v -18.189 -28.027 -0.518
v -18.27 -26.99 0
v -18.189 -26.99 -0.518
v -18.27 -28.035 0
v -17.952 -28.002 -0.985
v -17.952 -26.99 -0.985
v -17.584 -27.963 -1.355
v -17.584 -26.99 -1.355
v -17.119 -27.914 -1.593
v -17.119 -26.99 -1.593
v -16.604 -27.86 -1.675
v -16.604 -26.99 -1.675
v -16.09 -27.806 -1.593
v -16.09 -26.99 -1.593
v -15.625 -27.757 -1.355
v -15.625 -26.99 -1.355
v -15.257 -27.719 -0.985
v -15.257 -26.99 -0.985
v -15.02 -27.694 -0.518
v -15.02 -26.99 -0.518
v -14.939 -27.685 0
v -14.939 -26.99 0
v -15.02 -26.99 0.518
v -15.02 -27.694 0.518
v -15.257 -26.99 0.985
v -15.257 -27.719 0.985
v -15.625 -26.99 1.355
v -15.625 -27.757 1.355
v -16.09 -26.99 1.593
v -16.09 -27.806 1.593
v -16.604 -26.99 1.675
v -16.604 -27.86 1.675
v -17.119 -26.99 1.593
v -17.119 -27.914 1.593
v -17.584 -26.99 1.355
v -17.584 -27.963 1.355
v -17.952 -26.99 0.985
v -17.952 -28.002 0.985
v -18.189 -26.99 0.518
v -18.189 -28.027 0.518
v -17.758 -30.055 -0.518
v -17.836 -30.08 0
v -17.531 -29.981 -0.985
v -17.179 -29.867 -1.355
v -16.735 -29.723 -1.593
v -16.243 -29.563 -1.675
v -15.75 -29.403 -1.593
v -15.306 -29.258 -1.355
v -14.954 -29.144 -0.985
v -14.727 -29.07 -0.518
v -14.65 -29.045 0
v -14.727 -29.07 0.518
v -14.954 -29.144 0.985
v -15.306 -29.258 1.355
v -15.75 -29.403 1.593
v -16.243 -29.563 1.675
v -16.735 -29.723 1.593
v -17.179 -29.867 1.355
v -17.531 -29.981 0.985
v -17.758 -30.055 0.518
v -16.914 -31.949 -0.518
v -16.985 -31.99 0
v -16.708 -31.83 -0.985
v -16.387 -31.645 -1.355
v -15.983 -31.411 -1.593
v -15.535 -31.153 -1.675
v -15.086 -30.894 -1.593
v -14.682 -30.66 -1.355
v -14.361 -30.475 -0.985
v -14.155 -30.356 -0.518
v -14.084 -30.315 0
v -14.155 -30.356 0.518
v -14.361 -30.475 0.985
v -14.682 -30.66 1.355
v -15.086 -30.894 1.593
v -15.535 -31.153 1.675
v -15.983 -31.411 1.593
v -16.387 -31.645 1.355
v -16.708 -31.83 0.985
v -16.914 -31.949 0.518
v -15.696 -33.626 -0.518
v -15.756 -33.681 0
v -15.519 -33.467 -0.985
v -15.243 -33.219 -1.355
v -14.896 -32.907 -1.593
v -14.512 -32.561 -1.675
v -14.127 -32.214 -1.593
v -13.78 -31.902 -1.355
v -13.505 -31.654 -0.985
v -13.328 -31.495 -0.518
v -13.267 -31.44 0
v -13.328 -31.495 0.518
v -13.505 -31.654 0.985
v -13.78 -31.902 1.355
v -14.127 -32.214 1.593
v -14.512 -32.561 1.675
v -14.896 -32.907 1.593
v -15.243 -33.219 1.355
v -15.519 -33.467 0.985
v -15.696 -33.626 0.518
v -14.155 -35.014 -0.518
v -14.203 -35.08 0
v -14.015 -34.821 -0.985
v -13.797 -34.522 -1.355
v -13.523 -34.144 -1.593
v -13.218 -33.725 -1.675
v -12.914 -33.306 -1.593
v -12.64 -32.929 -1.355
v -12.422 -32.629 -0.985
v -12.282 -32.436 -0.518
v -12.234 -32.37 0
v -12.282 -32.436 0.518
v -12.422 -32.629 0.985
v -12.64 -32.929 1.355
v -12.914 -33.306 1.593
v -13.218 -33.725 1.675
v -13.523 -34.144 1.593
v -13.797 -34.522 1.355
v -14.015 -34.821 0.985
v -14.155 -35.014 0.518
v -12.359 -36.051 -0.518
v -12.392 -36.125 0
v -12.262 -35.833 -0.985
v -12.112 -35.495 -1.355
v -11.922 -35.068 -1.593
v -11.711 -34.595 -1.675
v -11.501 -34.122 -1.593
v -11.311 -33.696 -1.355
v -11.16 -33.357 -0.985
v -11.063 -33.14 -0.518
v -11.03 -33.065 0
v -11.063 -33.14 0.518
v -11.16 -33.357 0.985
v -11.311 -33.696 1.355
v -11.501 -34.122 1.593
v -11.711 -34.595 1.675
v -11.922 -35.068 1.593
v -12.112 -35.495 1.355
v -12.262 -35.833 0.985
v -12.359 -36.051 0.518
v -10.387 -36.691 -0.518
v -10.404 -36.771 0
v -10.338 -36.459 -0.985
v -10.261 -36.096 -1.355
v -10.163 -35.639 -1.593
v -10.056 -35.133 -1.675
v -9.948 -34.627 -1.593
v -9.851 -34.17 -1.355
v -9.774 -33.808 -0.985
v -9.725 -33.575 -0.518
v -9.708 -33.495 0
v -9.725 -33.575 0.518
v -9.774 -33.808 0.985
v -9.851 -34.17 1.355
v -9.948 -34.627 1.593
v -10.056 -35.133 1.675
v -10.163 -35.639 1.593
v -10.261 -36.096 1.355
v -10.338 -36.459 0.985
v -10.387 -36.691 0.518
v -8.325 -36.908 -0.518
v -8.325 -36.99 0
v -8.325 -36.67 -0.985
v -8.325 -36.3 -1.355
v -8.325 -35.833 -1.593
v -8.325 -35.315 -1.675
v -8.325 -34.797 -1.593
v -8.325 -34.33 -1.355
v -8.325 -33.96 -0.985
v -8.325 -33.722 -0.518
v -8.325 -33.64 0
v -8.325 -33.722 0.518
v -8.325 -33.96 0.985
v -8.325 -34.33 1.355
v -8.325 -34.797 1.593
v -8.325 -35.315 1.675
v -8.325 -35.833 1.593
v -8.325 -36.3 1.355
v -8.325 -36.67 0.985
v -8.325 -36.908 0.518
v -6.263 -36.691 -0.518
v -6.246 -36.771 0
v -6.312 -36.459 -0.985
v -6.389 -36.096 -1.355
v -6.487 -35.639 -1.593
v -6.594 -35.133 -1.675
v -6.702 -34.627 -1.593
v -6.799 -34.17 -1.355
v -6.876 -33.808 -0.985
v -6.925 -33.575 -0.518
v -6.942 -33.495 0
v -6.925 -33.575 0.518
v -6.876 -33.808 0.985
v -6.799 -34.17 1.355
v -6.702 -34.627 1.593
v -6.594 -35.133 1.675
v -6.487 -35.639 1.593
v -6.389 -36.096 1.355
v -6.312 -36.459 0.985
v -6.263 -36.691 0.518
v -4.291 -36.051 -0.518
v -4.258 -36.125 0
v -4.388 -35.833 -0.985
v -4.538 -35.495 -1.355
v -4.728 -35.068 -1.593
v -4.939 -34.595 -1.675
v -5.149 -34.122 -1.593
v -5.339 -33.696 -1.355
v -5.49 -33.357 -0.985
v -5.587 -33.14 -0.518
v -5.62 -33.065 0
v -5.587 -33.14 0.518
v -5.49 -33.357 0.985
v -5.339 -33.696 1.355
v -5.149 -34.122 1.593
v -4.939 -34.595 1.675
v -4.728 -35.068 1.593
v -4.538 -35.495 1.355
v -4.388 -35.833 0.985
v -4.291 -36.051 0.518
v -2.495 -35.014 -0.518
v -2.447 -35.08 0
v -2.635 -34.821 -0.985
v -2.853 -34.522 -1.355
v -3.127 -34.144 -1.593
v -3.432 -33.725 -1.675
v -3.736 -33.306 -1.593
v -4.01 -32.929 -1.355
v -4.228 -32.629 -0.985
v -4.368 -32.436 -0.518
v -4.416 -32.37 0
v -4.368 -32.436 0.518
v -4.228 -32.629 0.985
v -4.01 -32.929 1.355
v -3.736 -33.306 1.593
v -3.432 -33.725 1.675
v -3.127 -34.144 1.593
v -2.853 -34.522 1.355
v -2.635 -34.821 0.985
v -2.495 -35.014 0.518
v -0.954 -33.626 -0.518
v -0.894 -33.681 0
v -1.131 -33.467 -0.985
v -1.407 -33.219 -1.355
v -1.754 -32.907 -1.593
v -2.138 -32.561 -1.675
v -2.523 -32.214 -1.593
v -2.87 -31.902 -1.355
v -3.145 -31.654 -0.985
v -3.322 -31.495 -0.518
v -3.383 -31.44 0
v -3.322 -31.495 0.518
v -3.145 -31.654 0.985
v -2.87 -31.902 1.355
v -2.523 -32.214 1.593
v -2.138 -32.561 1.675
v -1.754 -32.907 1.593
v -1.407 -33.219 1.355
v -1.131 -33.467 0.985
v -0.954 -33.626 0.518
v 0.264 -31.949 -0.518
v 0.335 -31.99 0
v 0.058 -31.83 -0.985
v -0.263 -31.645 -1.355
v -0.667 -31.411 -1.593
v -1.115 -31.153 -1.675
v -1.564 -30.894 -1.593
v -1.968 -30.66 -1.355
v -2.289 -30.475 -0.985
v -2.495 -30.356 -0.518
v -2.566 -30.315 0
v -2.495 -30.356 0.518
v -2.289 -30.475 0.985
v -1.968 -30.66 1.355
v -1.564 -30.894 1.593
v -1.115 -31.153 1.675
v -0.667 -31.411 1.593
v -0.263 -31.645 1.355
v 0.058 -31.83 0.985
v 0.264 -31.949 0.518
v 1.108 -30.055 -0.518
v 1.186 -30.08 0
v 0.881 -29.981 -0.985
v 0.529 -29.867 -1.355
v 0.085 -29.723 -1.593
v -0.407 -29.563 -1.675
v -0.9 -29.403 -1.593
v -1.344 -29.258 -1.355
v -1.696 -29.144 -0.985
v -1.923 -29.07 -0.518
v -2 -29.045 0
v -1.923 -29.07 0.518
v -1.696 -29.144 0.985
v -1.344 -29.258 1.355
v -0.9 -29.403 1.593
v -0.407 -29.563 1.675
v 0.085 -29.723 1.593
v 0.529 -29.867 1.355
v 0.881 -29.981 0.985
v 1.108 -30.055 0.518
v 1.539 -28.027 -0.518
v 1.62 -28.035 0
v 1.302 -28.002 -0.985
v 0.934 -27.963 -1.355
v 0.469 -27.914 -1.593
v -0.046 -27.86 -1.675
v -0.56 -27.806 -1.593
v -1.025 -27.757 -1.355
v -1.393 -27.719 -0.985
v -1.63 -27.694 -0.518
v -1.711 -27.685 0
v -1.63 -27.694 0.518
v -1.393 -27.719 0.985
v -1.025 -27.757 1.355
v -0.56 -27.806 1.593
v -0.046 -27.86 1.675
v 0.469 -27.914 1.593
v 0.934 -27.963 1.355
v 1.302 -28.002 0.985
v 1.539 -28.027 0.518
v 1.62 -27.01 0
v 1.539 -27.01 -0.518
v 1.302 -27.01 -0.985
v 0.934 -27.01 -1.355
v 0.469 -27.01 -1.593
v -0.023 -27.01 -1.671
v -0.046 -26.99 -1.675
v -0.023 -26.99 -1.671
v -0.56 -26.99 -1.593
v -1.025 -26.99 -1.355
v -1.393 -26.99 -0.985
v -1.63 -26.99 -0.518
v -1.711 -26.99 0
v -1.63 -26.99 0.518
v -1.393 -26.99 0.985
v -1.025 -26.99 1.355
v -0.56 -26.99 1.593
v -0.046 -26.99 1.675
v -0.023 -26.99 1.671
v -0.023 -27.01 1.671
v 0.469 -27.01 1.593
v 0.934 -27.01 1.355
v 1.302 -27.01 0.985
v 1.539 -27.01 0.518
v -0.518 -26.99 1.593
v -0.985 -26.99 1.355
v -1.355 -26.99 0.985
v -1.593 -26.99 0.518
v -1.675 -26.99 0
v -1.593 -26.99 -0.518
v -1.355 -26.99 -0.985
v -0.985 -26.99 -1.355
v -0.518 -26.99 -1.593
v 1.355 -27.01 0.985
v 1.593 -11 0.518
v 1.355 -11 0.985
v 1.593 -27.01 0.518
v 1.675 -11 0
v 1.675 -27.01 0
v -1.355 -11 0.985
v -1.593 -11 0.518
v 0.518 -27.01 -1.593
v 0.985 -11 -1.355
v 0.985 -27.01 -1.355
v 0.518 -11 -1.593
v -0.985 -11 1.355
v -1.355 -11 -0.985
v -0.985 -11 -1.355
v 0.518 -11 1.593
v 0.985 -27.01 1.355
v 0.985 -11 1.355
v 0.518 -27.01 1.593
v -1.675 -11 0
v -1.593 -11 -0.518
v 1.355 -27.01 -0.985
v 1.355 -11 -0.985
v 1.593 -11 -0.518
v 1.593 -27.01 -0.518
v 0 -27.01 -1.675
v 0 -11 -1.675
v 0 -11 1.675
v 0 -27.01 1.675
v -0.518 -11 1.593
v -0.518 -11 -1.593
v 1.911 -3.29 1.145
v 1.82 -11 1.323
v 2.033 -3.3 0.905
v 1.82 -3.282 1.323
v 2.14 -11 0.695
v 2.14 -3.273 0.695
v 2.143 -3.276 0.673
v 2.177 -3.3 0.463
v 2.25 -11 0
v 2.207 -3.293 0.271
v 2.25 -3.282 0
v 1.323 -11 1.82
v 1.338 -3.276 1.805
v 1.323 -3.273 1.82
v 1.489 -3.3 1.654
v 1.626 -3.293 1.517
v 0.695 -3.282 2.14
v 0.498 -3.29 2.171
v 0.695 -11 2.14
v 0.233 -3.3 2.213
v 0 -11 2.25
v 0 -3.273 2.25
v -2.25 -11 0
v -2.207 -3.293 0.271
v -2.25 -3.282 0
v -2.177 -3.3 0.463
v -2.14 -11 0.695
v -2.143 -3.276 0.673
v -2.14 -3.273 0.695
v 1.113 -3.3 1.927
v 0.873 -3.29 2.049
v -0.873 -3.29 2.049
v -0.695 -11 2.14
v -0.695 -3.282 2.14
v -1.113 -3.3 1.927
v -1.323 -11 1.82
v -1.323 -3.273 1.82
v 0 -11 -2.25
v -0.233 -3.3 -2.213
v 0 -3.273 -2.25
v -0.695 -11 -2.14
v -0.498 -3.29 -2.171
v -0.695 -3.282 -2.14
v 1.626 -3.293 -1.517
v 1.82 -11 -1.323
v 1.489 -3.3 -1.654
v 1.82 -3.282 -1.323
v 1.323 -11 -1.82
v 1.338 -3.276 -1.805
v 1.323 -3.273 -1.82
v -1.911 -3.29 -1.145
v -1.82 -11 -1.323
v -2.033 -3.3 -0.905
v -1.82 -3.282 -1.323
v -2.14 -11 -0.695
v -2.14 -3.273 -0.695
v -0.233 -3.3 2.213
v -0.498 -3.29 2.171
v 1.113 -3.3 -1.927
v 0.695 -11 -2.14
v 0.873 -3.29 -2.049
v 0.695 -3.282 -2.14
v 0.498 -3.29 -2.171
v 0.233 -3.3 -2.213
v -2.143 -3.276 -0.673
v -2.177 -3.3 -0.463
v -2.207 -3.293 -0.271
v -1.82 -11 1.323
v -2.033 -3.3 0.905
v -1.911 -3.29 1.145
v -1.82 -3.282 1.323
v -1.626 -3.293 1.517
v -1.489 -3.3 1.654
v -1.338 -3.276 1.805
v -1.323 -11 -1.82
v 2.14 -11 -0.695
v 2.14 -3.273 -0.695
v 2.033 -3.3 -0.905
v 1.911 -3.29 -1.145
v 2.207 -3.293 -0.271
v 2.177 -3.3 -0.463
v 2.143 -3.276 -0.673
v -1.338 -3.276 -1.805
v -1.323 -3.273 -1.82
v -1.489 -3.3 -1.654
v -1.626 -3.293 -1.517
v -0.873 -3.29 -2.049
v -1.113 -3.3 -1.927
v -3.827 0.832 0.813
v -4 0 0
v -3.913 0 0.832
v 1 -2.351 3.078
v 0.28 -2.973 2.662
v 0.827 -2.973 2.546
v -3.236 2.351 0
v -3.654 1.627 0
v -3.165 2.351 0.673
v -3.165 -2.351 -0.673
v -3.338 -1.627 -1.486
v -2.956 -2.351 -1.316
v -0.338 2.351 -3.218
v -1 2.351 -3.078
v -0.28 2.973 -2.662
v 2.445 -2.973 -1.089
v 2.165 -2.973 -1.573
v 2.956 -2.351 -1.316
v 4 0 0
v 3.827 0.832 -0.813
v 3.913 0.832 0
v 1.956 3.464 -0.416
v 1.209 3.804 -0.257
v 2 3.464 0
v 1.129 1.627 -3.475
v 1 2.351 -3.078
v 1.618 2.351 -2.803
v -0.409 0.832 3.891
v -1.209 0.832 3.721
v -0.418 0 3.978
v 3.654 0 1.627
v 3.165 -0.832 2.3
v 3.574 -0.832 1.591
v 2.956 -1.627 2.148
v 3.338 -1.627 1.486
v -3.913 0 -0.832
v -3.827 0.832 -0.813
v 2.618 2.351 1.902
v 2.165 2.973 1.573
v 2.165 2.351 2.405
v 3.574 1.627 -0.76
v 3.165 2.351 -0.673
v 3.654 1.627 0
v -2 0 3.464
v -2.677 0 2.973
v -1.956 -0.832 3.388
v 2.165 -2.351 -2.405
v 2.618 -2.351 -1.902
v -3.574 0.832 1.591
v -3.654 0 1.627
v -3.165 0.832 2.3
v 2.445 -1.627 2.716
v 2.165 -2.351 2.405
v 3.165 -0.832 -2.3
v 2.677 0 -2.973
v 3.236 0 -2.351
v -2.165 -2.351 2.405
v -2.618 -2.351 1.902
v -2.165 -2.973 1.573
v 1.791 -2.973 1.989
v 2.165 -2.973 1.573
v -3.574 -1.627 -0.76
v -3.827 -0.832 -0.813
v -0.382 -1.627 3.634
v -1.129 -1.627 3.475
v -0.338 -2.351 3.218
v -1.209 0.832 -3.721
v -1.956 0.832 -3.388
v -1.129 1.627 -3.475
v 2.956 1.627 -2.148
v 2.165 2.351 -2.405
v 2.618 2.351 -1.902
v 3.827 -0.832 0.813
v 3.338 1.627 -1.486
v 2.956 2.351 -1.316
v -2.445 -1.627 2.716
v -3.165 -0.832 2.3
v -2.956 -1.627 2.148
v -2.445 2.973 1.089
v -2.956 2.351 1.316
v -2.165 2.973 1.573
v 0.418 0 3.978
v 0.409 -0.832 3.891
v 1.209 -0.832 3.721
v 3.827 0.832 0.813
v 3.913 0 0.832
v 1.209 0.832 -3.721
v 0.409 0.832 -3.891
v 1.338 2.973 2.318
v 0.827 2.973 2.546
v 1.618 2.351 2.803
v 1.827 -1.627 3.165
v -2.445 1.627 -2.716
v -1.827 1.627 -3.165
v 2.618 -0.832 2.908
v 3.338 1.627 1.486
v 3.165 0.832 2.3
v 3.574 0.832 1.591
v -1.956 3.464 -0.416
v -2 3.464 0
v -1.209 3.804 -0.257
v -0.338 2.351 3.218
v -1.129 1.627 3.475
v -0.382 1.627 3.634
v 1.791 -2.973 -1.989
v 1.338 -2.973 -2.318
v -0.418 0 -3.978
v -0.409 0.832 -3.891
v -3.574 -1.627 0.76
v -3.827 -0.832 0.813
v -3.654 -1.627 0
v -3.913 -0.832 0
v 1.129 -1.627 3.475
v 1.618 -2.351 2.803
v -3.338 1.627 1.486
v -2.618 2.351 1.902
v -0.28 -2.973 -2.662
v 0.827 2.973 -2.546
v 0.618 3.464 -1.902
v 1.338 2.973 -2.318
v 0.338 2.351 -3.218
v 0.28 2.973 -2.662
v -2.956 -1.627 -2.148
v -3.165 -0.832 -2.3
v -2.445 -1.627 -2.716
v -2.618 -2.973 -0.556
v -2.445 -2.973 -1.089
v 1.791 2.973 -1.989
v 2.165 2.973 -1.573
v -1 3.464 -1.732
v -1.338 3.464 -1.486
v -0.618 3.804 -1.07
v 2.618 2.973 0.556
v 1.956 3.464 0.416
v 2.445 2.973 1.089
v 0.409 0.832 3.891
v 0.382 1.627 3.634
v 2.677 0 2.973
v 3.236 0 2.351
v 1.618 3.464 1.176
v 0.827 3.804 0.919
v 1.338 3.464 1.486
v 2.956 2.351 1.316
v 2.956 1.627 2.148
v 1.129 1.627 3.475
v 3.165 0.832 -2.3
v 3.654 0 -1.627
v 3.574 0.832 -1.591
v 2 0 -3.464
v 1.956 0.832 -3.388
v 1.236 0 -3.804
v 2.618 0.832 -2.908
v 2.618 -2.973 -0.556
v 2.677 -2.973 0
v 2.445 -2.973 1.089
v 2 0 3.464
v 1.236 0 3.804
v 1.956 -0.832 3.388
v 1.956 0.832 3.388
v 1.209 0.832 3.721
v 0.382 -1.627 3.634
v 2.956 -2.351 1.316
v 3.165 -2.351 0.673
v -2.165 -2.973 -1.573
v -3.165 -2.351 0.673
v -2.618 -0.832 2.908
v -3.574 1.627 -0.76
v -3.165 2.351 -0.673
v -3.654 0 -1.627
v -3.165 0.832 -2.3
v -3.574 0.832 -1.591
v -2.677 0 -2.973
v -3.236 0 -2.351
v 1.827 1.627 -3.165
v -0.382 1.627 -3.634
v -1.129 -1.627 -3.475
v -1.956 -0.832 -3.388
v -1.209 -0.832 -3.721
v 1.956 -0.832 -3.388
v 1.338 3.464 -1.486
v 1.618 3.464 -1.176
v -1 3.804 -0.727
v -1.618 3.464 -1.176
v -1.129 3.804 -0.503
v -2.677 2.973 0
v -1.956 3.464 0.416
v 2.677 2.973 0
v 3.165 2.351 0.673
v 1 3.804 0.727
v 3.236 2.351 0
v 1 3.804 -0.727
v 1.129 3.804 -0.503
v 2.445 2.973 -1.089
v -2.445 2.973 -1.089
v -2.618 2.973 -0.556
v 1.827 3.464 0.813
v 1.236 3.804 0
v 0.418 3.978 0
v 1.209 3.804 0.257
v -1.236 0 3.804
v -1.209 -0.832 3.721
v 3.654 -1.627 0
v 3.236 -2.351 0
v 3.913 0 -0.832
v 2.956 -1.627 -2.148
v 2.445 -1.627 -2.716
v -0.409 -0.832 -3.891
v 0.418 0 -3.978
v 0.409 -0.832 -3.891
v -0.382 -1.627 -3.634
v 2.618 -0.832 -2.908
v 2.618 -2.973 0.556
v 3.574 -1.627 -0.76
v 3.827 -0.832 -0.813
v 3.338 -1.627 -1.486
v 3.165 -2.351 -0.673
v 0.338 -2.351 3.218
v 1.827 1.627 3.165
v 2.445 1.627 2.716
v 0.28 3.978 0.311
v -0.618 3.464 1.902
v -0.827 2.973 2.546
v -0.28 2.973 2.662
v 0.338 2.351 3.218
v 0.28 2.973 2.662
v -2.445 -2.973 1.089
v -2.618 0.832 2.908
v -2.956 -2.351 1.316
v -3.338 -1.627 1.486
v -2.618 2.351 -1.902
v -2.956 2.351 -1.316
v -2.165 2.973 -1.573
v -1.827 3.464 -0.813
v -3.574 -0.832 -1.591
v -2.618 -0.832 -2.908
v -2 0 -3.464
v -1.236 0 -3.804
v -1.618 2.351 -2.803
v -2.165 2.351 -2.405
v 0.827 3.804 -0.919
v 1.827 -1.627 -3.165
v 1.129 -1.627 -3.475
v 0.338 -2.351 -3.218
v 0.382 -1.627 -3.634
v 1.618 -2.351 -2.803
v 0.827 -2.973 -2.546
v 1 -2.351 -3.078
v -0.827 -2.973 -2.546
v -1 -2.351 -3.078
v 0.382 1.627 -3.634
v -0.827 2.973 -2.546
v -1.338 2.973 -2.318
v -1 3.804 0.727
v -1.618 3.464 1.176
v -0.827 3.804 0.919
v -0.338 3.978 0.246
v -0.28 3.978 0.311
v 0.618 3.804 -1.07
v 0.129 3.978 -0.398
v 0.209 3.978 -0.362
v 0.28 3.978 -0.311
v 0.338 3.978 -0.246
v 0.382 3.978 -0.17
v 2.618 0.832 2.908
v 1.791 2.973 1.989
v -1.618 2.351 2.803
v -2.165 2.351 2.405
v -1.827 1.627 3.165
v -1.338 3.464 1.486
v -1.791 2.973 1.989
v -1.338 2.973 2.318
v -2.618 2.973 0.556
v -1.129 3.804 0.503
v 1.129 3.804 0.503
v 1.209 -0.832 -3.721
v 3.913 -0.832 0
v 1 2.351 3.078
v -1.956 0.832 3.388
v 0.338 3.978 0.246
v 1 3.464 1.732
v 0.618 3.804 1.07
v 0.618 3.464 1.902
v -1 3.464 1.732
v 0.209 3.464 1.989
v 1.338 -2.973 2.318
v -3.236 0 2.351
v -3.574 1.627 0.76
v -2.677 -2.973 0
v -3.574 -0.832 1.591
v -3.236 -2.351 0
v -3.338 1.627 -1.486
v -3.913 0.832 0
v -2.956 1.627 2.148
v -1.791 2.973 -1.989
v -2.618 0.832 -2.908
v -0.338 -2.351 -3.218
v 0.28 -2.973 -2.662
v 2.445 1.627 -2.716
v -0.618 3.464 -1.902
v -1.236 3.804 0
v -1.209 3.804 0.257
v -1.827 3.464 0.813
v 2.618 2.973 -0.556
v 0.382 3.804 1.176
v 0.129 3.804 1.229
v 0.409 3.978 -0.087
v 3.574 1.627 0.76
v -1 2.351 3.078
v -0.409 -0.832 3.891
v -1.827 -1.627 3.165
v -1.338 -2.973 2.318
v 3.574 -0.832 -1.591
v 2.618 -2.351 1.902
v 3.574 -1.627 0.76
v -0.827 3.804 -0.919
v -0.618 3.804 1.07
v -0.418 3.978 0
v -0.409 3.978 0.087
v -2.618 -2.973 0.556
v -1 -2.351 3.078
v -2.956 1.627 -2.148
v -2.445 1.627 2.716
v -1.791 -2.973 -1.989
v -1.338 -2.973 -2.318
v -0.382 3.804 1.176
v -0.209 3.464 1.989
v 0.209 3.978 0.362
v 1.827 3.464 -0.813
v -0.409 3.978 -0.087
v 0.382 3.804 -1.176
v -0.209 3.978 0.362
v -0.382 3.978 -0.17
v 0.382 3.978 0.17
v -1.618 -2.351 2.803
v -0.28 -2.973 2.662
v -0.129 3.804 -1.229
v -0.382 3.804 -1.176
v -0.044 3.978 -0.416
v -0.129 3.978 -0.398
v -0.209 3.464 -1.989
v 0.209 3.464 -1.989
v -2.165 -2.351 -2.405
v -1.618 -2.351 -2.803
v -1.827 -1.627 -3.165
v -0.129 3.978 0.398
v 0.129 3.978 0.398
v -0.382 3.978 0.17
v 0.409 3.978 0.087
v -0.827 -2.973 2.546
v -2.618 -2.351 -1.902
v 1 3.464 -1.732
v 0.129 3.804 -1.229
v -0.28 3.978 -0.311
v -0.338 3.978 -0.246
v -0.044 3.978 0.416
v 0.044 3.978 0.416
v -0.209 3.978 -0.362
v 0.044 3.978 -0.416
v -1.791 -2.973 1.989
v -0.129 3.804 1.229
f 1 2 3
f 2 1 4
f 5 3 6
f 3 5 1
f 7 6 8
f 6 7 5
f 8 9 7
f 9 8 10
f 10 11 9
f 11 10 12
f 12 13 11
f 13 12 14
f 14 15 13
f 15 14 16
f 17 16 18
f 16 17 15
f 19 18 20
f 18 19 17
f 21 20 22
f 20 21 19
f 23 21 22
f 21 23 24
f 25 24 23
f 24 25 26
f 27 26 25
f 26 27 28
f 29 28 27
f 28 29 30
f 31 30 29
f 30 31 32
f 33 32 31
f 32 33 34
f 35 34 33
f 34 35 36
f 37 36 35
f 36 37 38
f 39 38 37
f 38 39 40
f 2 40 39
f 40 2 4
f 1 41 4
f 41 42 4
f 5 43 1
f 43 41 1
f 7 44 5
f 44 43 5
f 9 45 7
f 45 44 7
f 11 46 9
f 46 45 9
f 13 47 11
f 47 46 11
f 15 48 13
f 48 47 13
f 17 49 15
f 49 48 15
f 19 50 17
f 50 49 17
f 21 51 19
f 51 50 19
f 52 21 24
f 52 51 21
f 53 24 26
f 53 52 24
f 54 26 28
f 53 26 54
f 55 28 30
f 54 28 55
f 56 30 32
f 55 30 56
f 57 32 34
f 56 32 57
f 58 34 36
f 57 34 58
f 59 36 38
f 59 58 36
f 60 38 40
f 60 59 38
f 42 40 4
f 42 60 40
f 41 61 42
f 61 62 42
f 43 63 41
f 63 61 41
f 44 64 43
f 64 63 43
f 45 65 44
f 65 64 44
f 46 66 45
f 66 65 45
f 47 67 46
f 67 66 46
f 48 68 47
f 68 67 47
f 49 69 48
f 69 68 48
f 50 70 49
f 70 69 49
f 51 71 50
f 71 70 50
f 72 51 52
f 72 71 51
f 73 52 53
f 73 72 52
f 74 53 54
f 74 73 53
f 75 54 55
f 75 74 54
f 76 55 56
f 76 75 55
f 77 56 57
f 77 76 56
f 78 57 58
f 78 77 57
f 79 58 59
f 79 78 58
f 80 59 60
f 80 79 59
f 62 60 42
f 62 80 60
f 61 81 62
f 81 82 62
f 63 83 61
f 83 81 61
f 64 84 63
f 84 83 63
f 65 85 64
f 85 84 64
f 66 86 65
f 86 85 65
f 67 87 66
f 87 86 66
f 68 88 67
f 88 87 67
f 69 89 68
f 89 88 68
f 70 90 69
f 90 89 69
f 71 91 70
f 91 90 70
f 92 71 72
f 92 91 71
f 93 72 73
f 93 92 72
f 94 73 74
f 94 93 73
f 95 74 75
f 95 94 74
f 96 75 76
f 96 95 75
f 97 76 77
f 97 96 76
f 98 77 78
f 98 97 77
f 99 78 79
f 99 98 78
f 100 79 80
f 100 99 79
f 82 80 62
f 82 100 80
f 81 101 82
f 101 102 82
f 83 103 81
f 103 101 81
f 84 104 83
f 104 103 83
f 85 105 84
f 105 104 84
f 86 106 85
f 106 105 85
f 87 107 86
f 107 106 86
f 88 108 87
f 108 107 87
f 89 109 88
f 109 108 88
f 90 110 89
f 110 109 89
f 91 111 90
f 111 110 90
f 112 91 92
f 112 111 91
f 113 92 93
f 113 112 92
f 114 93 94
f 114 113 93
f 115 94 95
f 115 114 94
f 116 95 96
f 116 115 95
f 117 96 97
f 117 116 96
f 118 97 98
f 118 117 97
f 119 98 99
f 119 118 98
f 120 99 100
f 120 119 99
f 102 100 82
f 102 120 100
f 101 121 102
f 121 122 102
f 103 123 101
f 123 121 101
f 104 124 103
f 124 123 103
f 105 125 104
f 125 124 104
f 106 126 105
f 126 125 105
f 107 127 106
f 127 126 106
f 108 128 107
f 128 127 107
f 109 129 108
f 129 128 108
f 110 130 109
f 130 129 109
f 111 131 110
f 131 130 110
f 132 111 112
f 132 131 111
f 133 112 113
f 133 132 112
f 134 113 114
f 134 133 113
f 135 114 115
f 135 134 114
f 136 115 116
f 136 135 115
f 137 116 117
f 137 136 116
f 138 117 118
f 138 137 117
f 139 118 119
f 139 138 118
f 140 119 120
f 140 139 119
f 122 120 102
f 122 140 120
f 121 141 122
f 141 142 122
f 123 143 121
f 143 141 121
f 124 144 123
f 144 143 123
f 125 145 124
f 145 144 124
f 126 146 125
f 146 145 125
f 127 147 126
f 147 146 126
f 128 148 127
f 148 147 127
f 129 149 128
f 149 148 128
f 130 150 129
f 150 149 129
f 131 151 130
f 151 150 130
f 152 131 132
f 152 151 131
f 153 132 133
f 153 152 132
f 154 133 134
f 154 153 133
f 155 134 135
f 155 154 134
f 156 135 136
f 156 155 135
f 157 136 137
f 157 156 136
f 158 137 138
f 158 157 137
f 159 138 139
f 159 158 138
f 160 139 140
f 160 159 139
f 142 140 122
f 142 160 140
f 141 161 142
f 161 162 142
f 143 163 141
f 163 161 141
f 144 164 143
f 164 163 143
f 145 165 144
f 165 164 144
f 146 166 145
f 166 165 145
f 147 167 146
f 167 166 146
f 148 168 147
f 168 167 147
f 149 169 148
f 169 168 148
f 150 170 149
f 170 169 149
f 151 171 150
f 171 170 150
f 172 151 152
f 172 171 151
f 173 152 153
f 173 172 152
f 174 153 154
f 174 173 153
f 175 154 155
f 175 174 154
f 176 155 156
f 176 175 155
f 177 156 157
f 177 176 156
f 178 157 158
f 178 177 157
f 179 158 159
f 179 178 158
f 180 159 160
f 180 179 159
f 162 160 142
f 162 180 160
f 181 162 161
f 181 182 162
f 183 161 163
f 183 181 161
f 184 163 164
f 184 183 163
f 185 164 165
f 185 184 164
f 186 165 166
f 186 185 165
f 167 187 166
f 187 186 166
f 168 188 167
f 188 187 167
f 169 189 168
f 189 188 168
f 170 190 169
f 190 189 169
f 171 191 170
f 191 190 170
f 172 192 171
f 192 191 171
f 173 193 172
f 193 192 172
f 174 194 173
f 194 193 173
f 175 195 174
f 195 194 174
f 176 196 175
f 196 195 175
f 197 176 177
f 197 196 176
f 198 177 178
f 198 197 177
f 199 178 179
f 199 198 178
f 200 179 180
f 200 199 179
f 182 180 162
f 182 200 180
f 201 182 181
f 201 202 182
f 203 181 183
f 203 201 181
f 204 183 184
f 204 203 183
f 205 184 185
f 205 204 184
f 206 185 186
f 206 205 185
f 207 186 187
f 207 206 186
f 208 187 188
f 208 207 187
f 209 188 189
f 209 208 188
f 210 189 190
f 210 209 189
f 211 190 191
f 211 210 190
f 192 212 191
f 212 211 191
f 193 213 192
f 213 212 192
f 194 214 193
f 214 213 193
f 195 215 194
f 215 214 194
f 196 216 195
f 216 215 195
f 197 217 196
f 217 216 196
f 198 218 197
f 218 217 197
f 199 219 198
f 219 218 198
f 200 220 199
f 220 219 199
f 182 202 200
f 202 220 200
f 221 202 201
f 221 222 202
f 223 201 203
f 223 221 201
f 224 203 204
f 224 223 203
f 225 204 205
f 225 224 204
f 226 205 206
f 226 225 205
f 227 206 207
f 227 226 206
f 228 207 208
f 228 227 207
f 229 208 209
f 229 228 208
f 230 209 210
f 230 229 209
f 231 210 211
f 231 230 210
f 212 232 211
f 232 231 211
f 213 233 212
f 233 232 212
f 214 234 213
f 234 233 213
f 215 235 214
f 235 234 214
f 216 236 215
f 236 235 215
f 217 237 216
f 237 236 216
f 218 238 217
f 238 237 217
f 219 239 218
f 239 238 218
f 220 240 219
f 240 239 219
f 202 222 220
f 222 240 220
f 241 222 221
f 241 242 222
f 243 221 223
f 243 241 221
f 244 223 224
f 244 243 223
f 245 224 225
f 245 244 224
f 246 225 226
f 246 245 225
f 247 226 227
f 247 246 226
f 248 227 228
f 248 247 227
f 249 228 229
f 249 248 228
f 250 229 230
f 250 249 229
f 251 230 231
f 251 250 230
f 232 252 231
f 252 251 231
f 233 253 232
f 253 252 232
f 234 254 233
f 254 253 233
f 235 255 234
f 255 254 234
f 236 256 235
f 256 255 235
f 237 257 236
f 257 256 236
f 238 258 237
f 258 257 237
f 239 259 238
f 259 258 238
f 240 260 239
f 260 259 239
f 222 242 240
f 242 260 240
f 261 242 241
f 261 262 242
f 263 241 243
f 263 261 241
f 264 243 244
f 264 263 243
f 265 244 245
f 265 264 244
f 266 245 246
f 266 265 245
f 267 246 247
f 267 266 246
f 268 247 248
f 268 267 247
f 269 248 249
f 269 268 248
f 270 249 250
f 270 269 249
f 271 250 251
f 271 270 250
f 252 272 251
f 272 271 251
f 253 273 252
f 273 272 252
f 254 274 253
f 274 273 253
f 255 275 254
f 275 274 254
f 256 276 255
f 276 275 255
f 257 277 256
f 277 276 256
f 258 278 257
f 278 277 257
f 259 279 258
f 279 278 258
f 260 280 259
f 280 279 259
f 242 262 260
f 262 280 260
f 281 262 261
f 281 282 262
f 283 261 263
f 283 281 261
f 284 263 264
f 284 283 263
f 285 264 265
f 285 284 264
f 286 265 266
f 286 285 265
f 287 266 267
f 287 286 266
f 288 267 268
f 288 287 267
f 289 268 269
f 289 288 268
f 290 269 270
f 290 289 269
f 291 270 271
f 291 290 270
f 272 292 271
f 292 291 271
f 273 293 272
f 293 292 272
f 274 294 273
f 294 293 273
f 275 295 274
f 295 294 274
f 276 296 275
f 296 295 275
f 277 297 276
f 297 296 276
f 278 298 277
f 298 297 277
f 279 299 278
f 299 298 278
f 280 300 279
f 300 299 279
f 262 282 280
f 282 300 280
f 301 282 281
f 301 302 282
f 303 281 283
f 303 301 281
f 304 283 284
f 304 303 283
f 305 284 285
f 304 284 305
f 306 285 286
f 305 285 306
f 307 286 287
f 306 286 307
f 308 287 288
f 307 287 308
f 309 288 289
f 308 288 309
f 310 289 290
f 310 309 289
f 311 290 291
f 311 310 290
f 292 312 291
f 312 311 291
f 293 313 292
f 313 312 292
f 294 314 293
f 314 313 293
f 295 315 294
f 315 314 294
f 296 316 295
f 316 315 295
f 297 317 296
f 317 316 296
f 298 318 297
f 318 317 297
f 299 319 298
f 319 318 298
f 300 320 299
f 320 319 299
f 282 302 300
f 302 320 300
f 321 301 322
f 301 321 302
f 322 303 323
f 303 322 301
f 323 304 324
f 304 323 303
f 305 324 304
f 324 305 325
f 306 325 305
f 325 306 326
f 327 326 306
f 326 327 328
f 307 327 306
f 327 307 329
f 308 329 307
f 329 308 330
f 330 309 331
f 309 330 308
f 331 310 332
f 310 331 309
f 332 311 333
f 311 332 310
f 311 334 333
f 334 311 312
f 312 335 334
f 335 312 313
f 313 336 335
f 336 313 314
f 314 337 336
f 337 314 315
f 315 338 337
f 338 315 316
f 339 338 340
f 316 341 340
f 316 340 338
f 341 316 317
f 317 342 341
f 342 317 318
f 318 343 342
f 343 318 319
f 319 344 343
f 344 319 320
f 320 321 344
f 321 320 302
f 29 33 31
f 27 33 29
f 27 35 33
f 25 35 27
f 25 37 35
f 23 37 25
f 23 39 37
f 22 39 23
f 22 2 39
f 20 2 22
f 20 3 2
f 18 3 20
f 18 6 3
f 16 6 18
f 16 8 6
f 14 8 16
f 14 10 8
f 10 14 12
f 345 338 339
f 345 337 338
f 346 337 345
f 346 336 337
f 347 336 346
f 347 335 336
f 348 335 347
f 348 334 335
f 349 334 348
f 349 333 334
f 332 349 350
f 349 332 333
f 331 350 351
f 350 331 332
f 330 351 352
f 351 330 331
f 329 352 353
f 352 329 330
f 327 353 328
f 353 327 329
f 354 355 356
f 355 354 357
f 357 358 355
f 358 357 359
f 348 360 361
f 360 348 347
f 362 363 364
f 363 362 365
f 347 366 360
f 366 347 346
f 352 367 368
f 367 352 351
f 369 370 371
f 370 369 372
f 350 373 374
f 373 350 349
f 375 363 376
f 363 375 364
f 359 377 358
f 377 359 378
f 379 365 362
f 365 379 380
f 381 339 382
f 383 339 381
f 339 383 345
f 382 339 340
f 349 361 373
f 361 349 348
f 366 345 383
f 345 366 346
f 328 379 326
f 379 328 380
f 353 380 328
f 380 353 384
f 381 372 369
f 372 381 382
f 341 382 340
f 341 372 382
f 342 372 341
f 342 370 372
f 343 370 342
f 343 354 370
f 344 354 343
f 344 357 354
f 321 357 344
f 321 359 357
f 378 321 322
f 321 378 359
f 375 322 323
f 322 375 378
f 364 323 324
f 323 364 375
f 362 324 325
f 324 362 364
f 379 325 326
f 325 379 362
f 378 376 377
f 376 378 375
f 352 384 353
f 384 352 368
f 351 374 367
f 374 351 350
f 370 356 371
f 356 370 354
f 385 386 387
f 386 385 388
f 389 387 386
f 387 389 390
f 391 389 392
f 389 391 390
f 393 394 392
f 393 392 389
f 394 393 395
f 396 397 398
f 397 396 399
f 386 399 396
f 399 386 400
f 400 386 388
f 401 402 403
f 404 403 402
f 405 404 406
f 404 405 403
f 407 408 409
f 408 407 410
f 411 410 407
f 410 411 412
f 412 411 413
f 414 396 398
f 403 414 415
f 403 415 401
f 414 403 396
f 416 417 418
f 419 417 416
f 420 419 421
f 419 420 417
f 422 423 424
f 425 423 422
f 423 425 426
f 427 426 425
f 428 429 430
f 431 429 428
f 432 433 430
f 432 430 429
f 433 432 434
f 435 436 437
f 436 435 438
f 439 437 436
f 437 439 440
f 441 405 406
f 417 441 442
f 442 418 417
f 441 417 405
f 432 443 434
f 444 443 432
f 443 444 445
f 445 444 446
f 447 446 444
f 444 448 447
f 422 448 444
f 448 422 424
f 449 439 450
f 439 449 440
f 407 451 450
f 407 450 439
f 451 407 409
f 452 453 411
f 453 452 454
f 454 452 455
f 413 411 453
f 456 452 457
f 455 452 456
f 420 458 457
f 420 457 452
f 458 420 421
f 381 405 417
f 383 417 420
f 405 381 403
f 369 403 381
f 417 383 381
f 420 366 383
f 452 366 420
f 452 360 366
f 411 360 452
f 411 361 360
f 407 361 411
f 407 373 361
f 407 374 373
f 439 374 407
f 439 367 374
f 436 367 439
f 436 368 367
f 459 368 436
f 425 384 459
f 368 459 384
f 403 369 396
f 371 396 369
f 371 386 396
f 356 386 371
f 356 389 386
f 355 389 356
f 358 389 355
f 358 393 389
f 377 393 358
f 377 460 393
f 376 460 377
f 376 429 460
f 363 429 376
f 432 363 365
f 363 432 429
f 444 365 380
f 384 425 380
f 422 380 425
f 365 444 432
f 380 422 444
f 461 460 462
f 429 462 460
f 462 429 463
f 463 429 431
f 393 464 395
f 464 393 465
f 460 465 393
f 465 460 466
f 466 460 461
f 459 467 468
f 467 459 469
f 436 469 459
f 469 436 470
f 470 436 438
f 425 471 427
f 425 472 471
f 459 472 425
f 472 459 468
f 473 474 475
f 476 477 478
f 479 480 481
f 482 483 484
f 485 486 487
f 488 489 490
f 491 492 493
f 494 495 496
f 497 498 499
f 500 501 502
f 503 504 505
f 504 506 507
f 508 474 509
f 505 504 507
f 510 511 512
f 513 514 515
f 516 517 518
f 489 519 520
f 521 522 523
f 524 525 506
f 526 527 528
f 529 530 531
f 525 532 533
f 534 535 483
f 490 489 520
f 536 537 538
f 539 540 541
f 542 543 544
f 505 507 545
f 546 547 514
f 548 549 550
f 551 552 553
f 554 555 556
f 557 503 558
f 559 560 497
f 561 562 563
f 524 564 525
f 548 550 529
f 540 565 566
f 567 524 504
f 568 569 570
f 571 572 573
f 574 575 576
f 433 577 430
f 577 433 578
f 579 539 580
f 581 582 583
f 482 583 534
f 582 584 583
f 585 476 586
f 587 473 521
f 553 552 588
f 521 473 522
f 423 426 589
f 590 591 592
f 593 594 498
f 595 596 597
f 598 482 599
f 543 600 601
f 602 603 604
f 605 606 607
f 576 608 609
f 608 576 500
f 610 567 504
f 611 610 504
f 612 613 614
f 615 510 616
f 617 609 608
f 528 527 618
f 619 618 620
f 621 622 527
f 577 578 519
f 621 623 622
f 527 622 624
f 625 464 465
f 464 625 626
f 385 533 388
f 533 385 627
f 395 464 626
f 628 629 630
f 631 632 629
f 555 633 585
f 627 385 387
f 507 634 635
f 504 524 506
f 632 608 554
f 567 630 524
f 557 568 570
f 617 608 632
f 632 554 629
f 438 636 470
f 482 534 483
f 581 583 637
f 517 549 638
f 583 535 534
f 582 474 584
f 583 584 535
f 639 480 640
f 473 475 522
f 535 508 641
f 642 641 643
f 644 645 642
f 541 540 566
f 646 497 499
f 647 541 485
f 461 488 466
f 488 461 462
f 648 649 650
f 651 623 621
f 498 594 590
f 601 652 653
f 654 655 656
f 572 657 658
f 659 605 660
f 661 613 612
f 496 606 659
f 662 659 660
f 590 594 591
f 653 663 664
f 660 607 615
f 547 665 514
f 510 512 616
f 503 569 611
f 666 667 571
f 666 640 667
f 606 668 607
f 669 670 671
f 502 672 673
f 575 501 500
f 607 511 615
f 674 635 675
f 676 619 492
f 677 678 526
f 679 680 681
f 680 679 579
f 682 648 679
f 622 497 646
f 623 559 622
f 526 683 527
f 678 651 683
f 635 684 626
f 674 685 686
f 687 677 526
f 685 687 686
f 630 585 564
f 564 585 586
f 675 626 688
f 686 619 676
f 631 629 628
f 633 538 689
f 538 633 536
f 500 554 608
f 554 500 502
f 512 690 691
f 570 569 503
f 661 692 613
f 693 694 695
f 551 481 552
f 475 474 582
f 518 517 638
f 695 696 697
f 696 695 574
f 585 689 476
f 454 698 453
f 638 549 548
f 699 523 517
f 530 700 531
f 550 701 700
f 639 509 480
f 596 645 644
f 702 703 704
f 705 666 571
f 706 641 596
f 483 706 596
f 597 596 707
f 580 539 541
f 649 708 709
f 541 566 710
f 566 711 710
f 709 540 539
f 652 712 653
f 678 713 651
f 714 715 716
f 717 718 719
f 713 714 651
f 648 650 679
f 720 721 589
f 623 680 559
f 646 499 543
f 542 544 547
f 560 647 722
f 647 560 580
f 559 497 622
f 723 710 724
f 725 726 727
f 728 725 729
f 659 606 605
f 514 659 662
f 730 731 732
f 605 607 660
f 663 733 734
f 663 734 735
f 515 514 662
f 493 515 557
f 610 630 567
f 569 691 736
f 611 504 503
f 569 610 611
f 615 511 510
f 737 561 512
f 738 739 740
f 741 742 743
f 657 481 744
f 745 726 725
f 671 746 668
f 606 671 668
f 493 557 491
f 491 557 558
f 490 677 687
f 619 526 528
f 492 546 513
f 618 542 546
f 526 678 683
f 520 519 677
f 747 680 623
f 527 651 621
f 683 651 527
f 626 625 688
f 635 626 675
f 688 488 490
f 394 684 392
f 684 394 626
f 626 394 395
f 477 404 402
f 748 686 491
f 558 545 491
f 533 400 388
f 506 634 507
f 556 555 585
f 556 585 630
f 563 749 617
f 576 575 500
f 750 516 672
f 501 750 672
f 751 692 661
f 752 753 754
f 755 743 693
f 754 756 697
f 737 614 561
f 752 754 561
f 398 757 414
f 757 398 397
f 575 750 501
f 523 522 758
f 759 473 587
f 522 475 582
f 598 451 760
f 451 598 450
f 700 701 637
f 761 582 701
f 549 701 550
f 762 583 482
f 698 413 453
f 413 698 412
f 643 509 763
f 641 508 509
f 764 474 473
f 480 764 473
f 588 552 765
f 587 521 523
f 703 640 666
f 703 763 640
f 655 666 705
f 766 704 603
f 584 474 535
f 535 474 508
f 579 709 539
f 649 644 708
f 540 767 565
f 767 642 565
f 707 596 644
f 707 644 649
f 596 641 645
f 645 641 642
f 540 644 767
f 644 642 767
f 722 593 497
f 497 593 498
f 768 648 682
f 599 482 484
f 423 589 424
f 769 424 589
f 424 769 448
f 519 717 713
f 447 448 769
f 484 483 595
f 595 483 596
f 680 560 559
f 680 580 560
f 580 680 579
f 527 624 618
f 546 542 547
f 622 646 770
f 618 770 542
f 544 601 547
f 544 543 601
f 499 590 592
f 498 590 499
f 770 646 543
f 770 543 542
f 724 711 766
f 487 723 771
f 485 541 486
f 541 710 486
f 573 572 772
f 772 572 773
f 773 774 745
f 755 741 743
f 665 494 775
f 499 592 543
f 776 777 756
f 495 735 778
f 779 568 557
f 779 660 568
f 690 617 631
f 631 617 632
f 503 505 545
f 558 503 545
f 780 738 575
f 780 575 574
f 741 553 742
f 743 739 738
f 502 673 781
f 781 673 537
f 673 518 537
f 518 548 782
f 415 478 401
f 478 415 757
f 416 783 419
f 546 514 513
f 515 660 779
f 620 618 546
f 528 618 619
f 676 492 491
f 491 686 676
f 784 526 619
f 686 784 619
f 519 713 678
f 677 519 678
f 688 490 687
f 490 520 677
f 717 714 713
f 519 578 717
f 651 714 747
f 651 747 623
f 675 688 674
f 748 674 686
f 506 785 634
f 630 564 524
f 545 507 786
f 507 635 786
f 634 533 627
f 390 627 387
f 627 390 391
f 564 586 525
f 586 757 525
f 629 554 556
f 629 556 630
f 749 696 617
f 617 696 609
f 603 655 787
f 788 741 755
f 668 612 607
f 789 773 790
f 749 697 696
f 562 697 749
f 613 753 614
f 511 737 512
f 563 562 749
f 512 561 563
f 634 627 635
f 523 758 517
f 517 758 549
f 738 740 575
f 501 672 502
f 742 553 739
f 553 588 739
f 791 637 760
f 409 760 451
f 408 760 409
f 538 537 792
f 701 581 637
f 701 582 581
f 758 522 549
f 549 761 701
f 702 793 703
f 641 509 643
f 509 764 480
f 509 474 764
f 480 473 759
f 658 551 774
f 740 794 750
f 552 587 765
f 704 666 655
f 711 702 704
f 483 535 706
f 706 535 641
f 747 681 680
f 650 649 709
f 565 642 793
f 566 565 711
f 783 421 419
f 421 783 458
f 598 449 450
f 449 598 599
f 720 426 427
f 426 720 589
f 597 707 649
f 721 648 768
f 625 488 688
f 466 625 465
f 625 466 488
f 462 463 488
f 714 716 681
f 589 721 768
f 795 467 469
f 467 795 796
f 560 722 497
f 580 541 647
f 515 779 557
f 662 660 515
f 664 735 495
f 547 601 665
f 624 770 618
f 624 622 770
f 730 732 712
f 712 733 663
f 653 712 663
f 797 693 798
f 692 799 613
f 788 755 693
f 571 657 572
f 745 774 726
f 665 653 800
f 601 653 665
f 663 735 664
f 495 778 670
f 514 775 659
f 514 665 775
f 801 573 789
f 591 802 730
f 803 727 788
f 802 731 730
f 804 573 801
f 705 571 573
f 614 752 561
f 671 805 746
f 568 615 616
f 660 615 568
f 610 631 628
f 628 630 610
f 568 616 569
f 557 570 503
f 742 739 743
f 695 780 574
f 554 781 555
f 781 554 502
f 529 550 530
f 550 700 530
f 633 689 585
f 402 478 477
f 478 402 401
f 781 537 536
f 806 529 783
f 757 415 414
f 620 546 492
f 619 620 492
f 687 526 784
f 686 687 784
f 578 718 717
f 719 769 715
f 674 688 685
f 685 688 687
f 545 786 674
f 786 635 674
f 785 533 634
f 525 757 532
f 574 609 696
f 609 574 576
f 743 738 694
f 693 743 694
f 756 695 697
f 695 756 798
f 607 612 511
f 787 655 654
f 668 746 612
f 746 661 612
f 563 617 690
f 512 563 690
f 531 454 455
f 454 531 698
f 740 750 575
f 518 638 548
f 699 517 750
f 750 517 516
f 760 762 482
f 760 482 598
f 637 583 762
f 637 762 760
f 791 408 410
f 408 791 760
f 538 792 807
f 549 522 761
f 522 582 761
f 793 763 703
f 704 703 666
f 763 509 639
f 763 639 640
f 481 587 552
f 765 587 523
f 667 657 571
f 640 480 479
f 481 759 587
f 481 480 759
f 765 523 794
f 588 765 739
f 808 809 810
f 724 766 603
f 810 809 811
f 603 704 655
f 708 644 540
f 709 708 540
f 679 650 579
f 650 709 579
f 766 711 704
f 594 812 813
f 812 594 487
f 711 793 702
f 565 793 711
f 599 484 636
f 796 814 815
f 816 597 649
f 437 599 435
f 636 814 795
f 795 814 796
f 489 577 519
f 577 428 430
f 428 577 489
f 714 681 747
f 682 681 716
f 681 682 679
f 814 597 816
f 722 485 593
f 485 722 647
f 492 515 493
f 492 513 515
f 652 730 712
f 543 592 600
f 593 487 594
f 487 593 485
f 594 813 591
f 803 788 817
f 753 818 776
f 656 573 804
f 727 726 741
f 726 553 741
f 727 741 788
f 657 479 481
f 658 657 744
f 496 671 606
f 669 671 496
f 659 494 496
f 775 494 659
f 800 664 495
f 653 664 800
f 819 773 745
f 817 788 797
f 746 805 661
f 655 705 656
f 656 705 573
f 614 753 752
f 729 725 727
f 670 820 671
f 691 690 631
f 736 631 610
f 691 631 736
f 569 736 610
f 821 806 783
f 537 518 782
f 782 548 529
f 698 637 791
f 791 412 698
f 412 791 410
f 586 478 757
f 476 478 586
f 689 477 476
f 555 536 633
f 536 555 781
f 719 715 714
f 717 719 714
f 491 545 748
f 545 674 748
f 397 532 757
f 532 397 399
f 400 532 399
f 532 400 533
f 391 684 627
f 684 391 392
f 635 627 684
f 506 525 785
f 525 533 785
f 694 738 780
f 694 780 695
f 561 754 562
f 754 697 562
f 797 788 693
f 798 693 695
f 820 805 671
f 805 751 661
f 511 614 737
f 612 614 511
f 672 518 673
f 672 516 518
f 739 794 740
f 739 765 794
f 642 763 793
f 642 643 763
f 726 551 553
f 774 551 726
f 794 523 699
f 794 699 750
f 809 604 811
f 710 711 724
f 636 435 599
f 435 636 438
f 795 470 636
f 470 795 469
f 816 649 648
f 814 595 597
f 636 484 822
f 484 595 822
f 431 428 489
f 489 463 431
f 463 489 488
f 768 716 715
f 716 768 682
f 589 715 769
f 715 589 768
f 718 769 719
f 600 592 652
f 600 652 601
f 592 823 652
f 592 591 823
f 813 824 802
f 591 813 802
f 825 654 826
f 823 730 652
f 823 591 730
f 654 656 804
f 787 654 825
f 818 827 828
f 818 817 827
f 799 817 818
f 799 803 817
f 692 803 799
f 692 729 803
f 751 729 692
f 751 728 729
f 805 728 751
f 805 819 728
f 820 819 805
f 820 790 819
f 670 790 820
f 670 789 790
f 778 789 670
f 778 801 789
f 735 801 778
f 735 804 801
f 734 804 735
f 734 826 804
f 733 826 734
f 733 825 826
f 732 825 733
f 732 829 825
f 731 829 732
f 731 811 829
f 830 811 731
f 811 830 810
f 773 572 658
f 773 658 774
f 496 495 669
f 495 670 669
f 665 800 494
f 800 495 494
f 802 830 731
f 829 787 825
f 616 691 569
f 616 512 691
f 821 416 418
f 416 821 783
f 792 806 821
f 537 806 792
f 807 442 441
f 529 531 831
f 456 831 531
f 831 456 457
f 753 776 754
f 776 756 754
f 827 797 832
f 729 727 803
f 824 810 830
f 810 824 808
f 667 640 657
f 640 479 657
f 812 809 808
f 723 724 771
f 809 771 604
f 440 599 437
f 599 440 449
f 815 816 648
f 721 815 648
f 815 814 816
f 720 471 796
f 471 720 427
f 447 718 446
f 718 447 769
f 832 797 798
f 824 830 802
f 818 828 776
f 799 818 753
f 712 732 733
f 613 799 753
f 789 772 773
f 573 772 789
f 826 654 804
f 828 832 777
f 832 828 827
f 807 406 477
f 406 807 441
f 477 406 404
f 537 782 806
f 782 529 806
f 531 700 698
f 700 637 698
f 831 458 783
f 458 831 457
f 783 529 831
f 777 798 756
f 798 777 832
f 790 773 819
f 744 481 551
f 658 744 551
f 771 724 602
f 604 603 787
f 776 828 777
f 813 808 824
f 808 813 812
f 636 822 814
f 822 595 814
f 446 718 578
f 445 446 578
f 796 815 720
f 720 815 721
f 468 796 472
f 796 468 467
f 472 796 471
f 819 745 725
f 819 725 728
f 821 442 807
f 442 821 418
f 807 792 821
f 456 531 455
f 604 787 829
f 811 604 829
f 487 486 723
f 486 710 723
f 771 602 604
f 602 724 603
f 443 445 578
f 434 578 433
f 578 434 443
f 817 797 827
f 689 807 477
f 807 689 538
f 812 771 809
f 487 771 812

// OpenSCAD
hook_diameter = 3.35;
plug_diameter = 4.5;
ball_diameter = 8;

plug_height = 5;
hook_height = 20;

curve_diameter = 20 - hook_diameter;

include <MCAD/units.scad>
use <MCAD/2Dshapes.scad>

module hook ()
{
    intersection () {
        rotate_extrude ()
        translate ([curve_diameter / 2, 0, 0])
        circle (d=hook_diameter, $fn=20);

        linear_extrude (h=curve_diameter + epsilon, center=true)
        pieSlice (size=curve_diameter + epsilon, start_angle=-90, end_angle=90);
    }
}

module suction_cup_hook () {
    rotate (90, X) {
        sphere (d=ball_diameter, $fn=30);

        translate ([0, 0, ball_diameter/4]) {
            // plug that goes into the suction cup socket
            cylinder (d=plug_diameter, h=plug_height + ball_diameter/2, $fn=20);

            // long arm of the hook
            translate ([0, 0, plug_height - epsilon]) {
                cylinder (d=hook_diameter, h=hook_height + epsilon * 2, $fn=20);

                translate ([-curve_diameter/2, 0, hook_height])
                rotate (-90, Y)
                rotate (90, X)
                hook ();
            }
        }
    }
}

suction_cup_hook ();
